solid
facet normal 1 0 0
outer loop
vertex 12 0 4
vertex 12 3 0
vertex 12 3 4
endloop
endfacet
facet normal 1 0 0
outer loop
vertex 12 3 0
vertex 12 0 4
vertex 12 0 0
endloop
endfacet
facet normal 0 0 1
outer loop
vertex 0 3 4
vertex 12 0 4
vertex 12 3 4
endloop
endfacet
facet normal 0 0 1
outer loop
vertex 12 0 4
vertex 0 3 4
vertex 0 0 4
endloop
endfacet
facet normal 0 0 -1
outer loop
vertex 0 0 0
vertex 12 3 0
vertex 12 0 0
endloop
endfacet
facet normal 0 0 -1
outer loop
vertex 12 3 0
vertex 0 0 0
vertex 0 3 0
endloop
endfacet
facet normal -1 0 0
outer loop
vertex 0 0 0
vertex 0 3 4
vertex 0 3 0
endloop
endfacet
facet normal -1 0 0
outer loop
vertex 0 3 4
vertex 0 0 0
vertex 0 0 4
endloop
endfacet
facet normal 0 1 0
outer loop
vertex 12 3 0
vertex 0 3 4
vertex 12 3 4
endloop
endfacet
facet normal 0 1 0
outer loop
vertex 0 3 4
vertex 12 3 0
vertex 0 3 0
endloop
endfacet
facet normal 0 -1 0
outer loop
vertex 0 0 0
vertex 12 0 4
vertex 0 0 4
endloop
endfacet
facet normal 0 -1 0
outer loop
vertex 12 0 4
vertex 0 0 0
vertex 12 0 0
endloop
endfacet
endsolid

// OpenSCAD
cube(size = [12,3,4], center = false);
cube(size = [12,3,4], center = false);
